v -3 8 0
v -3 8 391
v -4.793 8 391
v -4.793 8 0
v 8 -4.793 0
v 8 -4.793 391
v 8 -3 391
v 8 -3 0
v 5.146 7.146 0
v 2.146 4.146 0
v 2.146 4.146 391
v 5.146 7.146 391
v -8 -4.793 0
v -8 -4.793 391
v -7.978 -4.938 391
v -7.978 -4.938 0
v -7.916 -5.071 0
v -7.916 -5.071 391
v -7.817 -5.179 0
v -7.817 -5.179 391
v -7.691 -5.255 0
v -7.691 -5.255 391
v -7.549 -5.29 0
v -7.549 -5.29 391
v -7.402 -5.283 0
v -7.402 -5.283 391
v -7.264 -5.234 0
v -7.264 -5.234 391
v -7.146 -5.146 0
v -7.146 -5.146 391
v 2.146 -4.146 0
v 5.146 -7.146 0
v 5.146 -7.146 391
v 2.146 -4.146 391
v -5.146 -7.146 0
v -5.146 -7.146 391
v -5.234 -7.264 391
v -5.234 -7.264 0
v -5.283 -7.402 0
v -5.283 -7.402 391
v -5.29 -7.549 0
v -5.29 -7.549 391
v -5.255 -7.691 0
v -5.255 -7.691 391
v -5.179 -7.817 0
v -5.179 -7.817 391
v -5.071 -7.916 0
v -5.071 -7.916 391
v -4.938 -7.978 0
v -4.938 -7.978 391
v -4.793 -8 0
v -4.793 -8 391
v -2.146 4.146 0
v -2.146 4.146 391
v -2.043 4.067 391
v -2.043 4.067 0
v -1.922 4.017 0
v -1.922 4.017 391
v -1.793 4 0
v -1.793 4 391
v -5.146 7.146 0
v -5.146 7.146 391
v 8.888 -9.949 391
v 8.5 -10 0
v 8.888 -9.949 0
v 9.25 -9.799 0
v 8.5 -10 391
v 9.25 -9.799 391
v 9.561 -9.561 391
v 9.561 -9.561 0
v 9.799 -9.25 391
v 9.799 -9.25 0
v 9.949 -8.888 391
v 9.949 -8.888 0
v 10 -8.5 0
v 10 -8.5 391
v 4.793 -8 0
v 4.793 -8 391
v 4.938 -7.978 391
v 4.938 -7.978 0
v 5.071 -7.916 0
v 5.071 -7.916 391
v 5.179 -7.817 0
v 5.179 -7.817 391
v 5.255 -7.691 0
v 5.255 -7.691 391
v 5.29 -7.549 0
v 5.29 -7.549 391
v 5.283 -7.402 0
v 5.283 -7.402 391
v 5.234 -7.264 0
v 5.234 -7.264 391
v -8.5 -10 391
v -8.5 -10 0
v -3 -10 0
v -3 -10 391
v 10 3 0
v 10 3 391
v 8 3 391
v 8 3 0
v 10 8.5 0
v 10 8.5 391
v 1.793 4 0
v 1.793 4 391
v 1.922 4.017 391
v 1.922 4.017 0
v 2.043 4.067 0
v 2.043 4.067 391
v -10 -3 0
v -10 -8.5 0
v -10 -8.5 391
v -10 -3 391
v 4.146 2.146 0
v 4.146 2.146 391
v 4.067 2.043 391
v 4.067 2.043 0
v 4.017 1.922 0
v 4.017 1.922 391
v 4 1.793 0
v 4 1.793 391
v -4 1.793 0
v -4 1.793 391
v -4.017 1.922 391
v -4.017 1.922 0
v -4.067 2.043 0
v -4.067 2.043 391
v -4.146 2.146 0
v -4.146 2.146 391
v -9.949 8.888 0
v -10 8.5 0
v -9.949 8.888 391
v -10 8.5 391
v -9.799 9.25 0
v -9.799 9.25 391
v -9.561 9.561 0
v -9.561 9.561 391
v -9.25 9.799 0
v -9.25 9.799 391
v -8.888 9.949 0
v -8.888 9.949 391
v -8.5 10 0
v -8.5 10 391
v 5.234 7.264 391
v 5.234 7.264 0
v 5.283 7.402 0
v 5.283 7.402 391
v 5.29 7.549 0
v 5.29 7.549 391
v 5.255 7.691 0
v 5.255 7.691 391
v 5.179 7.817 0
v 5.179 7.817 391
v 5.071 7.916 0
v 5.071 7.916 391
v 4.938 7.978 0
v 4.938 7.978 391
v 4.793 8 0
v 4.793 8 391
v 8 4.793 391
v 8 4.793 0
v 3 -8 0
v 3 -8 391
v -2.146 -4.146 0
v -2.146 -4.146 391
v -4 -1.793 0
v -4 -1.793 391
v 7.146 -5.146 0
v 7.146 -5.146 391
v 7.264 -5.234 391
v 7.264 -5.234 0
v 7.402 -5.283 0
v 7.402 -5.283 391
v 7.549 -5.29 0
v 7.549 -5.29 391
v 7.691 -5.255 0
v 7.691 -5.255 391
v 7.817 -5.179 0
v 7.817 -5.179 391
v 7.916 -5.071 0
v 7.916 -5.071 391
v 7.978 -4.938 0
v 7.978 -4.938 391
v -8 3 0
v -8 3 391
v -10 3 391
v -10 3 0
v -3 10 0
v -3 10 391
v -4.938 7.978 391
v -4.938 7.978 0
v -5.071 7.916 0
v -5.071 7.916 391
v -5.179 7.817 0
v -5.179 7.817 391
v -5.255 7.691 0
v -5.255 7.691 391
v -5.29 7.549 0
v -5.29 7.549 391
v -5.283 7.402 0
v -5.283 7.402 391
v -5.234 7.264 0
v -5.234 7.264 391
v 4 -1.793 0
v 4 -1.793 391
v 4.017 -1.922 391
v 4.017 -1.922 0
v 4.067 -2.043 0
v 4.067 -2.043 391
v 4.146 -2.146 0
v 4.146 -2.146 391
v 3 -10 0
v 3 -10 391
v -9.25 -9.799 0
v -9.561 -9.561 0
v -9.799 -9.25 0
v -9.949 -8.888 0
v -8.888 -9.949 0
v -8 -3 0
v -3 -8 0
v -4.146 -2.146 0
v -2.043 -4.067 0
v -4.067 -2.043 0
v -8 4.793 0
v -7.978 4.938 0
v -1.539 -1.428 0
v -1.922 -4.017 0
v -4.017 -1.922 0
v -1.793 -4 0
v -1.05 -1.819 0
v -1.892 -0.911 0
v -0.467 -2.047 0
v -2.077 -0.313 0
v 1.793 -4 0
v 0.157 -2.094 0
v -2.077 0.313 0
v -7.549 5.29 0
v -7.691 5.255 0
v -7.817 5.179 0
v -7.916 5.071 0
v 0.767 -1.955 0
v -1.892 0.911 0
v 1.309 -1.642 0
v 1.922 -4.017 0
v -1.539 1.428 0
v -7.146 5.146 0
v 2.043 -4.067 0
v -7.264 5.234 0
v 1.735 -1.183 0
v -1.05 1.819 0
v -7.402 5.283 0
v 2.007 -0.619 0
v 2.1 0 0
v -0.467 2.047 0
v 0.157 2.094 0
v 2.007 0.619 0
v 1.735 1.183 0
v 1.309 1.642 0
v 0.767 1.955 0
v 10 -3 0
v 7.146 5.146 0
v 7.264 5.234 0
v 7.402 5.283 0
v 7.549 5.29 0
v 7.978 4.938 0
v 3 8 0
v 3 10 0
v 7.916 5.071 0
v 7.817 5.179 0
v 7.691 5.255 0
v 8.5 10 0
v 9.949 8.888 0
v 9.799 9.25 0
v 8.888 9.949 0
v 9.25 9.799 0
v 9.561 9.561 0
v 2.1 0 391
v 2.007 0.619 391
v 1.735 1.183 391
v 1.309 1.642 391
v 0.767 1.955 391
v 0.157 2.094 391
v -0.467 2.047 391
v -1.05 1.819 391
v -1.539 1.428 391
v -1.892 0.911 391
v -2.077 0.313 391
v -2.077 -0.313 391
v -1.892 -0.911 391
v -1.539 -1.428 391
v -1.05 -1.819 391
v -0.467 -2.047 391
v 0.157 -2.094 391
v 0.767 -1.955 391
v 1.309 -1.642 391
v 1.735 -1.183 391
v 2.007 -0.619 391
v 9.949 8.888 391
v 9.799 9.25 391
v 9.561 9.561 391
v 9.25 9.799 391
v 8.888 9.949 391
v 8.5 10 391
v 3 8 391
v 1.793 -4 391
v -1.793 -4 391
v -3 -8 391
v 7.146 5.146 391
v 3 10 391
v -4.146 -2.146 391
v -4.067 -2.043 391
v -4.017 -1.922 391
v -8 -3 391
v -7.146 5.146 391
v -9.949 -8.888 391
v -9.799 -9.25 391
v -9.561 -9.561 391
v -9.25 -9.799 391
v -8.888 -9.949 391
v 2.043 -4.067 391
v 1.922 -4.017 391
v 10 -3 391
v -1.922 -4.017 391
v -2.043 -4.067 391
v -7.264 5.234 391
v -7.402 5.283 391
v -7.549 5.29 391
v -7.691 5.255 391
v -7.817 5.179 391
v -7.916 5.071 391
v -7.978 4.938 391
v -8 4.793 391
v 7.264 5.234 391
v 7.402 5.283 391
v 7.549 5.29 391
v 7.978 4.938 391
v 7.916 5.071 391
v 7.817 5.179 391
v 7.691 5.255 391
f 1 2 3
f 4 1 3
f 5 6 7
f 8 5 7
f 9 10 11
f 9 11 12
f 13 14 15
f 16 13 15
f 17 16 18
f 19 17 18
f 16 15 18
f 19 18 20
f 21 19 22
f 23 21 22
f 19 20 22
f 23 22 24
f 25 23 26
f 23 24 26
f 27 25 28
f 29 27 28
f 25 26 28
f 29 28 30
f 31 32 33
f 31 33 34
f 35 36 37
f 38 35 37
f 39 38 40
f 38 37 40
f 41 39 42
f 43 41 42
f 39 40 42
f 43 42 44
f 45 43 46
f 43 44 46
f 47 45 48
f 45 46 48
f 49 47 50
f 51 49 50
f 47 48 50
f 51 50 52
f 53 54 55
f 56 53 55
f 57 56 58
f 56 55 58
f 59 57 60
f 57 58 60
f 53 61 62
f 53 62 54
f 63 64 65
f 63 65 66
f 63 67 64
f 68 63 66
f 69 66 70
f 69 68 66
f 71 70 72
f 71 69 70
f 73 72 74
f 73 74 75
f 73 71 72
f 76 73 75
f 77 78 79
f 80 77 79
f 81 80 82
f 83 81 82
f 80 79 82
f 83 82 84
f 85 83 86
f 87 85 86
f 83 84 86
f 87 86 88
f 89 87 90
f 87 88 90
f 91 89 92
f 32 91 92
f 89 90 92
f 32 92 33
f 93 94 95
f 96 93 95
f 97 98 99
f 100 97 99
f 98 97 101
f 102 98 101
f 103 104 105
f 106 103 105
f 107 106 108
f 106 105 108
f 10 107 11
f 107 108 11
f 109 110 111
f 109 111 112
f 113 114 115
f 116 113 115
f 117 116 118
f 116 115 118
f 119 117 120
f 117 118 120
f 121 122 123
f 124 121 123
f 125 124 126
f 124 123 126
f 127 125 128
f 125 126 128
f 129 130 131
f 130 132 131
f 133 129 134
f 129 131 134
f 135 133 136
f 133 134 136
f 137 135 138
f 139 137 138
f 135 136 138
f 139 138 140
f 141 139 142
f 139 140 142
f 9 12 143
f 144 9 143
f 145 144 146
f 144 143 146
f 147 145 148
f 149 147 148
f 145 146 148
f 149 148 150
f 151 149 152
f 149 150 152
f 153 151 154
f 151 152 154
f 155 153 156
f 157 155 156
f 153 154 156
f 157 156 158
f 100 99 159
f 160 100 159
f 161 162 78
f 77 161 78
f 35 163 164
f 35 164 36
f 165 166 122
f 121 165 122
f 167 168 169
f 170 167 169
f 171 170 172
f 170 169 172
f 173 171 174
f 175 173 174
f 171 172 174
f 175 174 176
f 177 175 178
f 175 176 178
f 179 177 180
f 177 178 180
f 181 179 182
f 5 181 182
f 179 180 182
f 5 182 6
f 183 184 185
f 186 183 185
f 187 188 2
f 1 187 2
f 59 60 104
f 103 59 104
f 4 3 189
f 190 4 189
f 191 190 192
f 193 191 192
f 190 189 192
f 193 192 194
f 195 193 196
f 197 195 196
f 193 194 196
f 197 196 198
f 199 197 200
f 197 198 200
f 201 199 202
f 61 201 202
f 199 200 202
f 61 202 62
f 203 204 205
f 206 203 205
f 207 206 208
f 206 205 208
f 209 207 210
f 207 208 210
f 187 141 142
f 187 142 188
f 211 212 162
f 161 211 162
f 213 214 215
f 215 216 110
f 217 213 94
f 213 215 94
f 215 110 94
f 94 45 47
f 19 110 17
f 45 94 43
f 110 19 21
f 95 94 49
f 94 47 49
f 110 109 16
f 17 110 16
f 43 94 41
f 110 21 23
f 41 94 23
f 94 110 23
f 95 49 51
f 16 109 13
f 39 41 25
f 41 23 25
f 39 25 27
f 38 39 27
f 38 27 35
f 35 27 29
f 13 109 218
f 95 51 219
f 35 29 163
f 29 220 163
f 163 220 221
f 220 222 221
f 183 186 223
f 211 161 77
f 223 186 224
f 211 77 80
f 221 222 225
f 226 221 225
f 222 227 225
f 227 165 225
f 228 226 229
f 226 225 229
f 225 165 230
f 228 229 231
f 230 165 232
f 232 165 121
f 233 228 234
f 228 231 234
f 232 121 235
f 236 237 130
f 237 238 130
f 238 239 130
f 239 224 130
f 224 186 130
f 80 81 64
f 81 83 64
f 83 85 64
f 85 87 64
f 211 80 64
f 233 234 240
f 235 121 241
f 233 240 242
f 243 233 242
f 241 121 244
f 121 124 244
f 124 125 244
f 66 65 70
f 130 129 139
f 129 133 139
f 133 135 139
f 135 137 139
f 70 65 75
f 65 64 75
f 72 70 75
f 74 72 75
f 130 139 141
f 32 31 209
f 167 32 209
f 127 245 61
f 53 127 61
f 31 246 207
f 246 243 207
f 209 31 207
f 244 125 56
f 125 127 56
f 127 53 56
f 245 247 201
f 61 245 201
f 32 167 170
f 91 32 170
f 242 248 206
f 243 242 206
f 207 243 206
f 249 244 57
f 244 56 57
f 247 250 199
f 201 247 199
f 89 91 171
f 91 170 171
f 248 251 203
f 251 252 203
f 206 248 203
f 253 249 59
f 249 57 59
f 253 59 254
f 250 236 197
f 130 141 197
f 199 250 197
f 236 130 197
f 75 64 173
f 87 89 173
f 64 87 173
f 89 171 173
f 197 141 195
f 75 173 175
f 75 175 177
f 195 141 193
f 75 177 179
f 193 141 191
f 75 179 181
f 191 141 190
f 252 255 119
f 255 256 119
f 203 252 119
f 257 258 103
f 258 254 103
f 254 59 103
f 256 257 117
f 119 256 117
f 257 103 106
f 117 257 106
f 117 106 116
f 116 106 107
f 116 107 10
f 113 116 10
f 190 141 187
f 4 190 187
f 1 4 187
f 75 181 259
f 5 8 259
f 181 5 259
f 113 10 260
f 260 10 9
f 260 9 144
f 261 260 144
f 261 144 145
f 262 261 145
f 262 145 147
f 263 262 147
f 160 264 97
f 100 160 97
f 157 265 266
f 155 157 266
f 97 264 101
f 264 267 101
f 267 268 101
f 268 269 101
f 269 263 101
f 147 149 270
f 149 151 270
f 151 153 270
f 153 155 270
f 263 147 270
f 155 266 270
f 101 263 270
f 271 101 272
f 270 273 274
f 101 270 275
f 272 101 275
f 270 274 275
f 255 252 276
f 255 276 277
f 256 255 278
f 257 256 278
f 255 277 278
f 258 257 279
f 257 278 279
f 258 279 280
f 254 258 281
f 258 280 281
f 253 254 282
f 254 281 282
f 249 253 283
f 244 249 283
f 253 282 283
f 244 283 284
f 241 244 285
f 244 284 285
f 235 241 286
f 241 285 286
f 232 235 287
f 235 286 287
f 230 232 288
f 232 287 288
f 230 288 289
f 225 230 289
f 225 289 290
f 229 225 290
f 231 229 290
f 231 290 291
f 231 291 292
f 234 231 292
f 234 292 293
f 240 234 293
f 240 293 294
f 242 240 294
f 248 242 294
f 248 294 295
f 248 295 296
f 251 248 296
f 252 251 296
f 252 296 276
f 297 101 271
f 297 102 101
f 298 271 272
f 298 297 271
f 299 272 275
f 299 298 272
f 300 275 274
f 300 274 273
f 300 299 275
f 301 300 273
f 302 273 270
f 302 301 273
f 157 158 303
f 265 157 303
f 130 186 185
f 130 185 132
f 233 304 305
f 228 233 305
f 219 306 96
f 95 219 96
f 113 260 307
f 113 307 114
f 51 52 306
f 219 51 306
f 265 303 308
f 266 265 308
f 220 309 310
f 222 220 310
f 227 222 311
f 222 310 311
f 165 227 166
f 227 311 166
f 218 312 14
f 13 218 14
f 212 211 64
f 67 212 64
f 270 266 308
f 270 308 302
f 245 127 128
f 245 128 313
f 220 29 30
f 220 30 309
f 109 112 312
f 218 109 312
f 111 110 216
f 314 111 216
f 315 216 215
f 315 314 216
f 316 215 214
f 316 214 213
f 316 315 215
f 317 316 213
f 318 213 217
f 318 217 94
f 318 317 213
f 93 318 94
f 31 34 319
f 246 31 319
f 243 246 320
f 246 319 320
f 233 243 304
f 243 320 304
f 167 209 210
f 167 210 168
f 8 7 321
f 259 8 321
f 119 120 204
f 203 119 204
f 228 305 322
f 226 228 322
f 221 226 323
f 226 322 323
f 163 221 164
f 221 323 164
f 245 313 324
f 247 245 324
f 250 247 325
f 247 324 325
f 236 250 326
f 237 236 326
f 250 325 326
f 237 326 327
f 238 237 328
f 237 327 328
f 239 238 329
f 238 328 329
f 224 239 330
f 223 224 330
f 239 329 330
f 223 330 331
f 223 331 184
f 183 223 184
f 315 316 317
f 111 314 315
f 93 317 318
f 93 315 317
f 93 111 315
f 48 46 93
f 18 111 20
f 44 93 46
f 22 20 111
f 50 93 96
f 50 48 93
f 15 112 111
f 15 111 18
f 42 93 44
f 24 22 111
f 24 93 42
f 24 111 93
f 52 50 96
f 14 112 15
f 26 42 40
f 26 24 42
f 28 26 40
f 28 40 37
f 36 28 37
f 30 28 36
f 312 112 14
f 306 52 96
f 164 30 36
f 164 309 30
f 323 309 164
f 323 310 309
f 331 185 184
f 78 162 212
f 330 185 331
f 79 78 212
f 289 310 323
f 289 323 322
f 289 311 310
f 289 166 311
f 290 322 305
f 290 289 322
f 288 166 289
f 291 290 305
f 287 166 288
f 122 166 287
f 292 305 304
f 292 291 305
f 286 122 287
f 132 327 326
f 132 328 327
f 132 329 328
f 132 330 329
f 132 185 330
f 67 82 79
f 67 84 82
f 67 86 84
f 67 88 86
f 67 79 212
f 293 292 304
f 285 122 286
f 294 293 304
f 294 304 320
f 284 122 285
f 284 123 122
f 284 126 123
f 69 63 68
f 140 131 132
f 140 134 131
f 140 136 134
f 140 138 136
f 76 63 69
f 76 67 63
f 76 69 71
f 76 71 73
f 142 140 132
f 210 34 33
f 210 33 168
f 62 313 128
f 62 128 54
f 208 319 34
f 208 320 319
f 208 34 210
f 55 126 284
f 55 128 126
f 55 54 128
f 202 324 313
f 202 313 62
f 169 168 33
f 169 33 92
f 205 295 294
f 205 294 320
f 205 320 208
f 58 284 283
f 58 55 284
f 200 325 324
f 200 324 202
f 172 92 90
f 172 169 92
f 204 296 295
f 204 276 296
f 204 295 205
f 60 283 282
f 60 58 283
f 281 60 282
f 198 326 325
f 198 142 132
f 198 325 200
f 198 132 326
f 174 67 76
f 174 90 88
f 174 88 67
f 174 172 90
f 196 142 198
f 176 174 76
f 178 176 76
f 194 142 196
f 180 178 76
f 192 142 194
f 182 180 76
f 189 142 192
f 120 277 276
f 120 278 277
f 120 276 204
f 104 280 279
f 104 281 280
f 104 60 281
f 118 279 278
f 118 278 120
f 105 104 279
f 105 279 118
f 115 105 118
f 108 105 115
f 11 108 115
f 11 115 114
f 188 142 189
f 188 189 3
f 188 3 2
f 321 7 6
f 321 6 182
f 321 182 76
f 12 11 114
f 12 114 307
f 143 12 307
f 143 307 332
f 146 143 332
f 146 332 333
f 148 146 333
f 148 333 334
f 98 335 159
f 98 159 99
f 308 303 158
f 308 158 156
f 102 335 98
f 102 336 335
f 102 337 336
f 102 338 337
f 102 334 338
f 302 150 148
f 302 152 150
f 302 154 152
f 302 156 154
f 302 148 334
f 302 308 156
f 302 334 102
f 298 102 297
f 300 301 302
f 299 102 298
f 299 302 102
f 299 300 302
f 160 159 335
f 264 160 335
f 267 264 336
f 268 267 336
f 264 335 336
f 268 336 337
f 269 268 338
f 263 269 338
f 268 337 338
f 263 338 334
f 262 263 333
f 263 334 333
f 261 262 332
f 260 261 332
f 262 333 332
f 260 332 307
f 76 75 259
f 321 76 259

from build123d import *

# Parameters (mm, degrees)
SKETCH_1_W          = 20
SKETCH_1_H          = 20
EXTRUDE_1_DEPTH     = 391
FILLET_1_R          = 1.5
SKETCH_2_R          = 2.1
CUT_EXTRUDE_1_DEPTH = 392.255670885


with BuildPart() as part:
    # 草圖1 → 填料-伸長1 (new body)
    with BuildSketch(Plane.XY):
        Rectangle(SKETCH_1_W, SKETCH_1_H)
    extrude(amount=EXTRUDE_1_DEPTH)

    # 圓角1
    fillet_1_edges = [part.edges().sort_by_distance(p)[0] for p in [
        (-10, 10, 195.5),
        (10, 10, 195.5),
        (10, -10, 195.5),
        (-10, -10, 195.5),
    ]]
    fillet(fillet_1_edges, radius=FILLET_1_R)

    # 草圖2 → 除料-伸長1 (cut, through all)
    with BuildSketch(Plane.XY.offset(391)):
        Circle(SKETCH_2_R)
        with BuildLine():
            Line((10, 3), (8, 3))
            Line((8, 3), (8, 4.792893219))
            ThreePointArc((8, 4.792893219), (7.691341716, 5.254832985), (7.146446609, 5.146446609))
            Line((7.146446609, 5.146446609), (4.146446609, 2.146446609))
            ThreePointArc((4.146446609, 2.146446609), (4.038060234, 1.984234935), (4, 1.792893219))
            Line((4, 1.792893219), (4, -1.792893219))
            ThreePointArc((4, -1.792893219), (4.038060234, -1.984234935), (4.146446609, -2.146446609))
            Line((4.146446609, -2.146446609), (7.146446609, -5.146446609))
            ThreePointArc((7.146446609, -5.146446609), (7.691341716, -5.254832985), (8, -4.792893219))
            Line((8, -4.792893219), (8, -3))
            Line((8, -3), (10, -3))
            Line((10, -3), (10, 3))
        make_face()
        with BuildLine():
            Line((-3, -10), (3, -10))
            Line((3, -10), (3, -8))
            Line((3, -8), (4.792893219, -8))
            ThreePointArc((4.792893219, -8), (5.254832985, -7.691341716), (5.146446609, -7.146446609))
            Line((5.146446609, -7.146446609), (2.146446609, -4.146446609))
            ThreePointArc((2.146446609, -4.146446609), (1.984234935, -4.038060234), (1.792893219, -4))
            Line((1.792893219, -4), (-1.792893219, -4))
            ThreePointArc((-1.792893219, -4), (-1.984234935, -4.038060234), (-2.146446609, -4.146446609))
            Line((-2.146446609, -4.146446609), (-5.146446609, -7.146446609))
            ThreePointArc((-5.146446609, -7.146446609), (-5.254832985, -7.691341716), (-4.792893219, -8))
            Line((-4.792893219, -8), (-3, -8))
            Line((-3, -8), (-3, -10))
        make_face()
        with BuildLine():
            Line((-10, 3), (-10, -3))
            Line((-10, -3), (-8, -3))
            Line((-8, -3), (-8, -4.792893219))
            ThreePointArc((-8, -4.792893219), (-7.691341716, -5.254832985), (-7.146446609, -5.146446609))
            Line((-7.146446609, -5.146446609), (-4.146446609, -2.146446609))
            ThreePointArc((-4.146446609, -2.146446609), (-4.038060234, -1.984234935), (-4, -1.792893219))
            Line((-4, -1.792893219), (-4, 1.792893219))
            ThreePointArc((-4, 1.792893219), (-4.038060234, 1.984234935), (-4.146446609, 2.146446609))
            Line((-4.146446609, 2.146446609), (-7.146446609, 5.146446609))
            ThreePointArc((-7.146446609, 5.146446609), (-7.691341716, 5.254832985), (-8, 4.792893219))
            Line((-8, 4.792893219), (-8, 3))
            Line((-8, 3), (-10, 3))
        make_face()
        with BuildLine():
            Line((3, 10), (-3, 10))
            Line((-3, 10), (-3, 8))
            Line((-3, 8), (-4.792893219, 8))
            ThreePointArc((-4.792893219, 8), (-5.254832985, 7.691341716), (-5.146446609, 7.146446609))
            Line((-5.146446609, 7.146446609), (-2.146446609, 4.146446609))
            ThreePointArc((-2.146446609, 4.146446609), (-1.984234935, 4.038060234), (-1.792893219, 4))
            Line((-1.792893219, 4), (1.792893219, 4))
            ThreePointArc((1.792893219, 4), (1.984234935, 4.038060234), (2.146446609, 4.146446609))
            Line((2.146446609, 4.146446609), (5.146446609, 7.146446609))
            ThreePointArc((5.146446609, 7.146446609), (5.254832985, 7.691341716), (4.792893219, 8))
            Line((4.792893219, 8), (3, 8))
            Line((3, 8), (3, 10))
        make_face()
    extrude(amount=-CUT_EXTRUDE_1_DEPTH, mode=Mode.SUBTRACT)


solid = part.part
